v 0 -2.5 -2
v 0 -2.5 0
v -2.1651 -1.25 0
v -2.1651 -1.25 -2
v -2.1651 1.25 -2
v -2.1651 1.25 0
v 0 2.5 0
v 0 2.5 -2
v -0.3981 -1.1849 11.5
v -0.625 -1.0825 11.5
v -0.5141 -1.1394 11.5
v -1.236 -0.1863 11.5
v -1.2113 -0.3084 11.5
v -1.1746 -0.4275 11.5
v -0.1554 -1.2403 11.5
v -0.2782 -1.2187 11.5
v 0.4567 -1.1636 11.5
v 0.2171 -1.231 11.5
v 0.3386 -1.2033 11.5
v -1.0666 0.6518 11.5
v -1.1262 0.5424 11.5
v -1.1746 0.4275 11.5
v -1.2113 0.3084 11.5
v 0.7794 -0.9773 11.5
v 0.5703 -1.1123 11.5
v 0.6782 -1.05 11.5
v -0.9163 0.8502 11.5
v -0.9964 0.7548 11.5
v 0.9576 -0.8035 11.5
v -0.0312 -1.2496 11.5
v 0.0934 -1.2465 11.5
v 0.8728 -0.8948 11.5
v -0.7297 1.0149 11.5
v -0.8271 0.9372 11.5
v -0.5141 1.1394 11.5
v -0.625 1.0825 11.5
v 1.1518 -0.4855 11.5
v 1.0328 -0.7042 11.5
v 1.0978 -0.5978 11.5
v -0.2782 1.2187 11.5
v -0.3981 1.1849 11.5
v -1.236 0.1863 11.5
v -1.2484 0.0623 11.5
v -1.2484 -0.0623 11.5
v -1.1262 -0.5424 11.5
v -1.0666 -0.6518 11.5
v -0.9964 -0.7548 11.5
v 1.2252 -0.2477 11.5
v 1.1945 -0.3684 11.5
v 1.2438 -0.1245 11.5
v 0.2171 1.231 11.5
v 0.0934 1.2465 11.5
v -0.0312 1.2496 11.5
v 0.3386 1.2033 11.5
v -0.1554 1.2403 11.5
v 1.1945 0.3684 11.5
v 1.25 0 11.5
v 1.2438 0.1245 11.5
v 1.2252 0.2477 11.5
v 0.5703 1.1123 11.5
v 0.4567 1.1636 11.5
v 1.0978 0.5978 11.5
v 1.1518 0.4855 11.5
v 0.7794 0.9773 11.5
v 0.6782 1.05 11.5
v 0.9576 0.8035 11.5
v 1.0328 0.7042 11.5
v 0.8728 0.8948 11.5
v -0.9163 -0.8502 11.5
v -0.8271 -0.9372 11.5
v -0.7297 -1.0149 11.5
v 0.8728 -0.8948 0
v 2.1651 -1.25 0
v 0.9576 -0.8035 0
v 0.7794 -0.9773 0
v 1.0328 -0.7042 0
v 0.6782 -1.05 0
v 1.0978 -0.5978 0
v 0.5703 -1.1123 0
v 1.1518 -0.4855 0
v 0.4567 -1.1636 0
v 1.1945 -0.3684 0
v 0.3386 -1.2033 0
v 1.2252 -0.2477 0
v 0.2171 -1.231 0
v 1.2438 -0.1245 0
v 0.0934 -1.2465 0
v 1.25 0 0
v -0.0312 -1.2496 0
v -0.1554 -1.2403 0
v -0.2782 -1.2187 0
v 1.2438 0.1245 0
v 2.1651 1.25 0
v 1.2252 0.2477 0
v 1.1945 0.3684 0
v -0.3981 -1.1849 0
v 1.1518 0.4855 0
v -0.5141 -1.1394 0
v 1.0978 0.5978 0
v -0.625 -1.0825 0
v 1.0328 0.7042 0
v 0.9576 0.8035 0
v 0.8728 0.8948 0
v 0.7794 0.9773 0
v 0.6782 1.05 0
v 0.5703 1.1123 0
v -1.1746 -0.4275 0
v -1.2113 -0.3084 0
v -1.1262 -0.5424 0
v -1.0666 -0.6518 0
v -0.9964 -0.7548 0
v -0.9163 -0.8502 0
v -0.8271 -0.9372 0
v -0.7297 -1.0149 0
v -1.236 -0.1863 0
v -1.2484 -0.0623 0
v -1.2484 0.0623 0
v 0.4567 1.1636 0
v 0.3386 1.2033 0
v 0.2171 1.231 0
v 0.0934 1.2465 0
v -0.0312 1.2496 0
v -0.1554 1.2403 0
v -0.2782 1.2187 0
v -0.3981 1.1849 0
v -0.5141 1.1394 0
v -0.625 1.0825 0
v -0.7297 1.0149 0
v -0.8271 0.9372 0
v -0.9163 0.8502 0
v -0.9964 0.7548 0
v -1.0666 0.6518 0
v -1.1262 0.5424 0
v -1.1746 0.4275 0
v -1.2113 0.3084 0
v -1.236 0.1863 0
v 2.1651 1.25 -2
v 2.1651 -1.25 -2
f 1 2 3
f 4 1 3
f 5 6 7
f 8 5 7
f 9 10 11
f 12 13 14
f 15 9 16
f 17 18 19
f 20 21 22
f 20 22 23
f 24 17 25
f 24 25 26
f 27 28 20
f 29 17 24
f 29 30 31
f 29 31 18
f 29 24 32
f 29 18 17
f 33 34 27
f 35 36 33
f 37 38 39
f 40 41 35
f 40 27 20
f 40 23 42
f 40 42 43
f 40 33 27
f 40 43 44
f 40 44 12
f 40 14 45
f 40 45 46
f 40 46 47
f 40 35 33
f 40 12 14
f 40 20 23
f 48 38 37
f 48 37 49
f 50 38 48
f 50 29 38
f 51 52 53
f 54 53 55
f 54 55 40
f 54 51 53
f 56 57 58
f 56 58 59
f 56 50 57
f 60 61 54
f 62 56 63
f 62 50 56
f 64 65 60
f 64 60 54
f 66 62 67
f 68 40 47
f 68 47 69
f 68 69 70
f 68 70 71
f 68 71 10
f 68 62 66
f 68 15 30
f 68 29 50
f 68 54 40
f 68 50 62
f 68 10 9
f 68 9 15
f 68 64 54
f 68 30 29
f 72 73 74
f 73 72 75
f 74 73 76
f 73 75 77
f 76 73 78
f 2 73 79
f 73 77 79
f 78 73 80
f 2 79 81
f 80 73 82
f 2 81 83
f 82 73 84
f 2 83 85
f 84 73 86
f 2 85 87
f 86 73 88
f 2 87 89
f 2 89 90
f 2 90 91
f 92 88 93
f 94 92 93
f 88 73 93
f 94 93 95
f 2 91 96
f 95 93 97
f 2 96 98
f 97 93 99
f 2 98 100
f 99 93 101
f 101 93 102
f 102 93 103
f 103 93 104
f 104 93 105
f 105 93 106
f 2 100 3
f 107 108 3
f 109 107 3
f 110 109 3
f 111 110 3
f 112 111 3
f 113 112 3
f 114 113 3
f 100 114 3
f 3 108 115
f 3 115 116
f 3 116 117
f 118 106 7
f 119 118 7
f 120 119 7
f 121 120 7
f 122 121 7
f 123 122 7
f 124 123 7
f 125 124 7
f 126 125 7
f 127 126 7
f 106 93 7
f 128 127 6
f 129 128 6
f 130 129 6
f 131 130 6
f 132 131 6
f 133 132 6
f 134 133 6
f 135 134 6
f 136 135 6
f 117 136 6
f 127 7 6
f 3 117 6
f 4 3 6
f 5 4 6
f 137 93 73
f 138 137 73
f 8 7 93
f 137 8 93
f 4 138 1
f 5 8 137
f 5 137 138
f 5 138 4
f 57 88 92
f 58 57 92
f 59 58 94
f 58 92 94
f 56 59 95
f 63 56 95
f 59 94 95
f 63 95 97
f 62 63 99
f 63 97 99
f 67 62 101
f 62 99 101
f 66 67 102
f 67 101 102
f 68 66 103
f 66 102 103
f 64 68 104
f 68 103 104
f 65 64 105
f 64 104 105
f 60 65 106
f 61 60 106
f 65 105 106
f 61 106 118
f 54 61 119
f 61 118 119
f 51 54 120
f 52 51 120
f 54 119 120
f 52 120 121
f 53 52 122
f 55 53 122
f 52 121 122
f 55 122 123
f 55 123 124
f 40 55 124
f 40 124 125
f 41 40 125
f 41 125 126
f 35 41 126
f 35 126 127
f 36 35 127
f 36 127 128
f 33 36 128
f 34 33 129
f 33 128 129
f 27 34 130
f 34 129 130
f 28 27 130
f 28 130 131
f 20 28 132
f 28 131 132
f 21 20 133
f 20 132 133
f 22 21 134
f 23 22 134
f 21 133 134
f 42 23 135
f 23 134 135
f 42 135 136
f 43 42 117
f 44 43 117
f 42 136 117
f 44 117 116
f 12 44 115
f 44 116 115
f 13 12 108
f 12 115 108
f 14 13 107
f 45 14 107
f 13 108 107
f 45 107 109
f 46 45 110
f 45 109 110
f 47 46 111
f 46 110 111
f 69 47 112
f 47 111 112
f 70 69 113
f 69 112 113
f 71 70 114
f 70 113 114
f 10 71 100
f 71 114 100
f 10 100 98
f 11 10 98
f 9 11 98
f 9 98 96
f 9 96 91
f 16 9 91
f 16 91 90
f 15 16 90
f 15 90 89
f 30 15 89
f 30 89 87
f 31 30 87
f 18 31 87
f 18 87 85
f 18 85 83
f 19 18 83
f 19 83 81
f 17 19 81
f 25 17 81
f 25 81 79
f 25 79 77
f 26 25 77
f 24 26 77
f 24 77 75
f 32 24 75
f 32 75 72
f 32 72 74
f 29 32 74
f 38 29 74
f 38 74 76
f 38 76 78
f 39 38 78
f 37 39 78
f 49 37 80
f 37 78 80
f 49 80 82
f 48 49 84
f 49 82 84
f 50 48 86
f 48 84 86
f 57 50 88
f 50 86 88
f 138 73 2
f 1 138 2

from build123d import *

# Parameters (mm, degrees)
ESQUISSE1_R        = 1.25
BOSS_EXTRU_1_DEPTH = 11.5
BOSS_EXTRU_2_DEPTH = 2


with BuildPart() as part:
    # Esquisse1 → Boss.-Extru.1 (new body)
    with BuildSketch(Plane.XY):
        Circle(ESQUISSE1_R)
    extrude(amount=BOSS_EXTRU_1_DEPTH)

    # Esquisse2 → Boss.-Extru.2 (add)
    with BuildSketch(Plane(origin=(0, 0, 0), x_dir=(-1, 0, 0), z_dir=(0, 0, -1))):
        Polygon((0, 2.5), (-2.165063509, 1.25), (-2.165063509, -1.25), (0, -2.5), (2.165063509, -1.25), (2.165063509, 1.25), align=None)
    extrude(amount=BOSS_EXTRU_2_DEPTH)


solid = part.part
